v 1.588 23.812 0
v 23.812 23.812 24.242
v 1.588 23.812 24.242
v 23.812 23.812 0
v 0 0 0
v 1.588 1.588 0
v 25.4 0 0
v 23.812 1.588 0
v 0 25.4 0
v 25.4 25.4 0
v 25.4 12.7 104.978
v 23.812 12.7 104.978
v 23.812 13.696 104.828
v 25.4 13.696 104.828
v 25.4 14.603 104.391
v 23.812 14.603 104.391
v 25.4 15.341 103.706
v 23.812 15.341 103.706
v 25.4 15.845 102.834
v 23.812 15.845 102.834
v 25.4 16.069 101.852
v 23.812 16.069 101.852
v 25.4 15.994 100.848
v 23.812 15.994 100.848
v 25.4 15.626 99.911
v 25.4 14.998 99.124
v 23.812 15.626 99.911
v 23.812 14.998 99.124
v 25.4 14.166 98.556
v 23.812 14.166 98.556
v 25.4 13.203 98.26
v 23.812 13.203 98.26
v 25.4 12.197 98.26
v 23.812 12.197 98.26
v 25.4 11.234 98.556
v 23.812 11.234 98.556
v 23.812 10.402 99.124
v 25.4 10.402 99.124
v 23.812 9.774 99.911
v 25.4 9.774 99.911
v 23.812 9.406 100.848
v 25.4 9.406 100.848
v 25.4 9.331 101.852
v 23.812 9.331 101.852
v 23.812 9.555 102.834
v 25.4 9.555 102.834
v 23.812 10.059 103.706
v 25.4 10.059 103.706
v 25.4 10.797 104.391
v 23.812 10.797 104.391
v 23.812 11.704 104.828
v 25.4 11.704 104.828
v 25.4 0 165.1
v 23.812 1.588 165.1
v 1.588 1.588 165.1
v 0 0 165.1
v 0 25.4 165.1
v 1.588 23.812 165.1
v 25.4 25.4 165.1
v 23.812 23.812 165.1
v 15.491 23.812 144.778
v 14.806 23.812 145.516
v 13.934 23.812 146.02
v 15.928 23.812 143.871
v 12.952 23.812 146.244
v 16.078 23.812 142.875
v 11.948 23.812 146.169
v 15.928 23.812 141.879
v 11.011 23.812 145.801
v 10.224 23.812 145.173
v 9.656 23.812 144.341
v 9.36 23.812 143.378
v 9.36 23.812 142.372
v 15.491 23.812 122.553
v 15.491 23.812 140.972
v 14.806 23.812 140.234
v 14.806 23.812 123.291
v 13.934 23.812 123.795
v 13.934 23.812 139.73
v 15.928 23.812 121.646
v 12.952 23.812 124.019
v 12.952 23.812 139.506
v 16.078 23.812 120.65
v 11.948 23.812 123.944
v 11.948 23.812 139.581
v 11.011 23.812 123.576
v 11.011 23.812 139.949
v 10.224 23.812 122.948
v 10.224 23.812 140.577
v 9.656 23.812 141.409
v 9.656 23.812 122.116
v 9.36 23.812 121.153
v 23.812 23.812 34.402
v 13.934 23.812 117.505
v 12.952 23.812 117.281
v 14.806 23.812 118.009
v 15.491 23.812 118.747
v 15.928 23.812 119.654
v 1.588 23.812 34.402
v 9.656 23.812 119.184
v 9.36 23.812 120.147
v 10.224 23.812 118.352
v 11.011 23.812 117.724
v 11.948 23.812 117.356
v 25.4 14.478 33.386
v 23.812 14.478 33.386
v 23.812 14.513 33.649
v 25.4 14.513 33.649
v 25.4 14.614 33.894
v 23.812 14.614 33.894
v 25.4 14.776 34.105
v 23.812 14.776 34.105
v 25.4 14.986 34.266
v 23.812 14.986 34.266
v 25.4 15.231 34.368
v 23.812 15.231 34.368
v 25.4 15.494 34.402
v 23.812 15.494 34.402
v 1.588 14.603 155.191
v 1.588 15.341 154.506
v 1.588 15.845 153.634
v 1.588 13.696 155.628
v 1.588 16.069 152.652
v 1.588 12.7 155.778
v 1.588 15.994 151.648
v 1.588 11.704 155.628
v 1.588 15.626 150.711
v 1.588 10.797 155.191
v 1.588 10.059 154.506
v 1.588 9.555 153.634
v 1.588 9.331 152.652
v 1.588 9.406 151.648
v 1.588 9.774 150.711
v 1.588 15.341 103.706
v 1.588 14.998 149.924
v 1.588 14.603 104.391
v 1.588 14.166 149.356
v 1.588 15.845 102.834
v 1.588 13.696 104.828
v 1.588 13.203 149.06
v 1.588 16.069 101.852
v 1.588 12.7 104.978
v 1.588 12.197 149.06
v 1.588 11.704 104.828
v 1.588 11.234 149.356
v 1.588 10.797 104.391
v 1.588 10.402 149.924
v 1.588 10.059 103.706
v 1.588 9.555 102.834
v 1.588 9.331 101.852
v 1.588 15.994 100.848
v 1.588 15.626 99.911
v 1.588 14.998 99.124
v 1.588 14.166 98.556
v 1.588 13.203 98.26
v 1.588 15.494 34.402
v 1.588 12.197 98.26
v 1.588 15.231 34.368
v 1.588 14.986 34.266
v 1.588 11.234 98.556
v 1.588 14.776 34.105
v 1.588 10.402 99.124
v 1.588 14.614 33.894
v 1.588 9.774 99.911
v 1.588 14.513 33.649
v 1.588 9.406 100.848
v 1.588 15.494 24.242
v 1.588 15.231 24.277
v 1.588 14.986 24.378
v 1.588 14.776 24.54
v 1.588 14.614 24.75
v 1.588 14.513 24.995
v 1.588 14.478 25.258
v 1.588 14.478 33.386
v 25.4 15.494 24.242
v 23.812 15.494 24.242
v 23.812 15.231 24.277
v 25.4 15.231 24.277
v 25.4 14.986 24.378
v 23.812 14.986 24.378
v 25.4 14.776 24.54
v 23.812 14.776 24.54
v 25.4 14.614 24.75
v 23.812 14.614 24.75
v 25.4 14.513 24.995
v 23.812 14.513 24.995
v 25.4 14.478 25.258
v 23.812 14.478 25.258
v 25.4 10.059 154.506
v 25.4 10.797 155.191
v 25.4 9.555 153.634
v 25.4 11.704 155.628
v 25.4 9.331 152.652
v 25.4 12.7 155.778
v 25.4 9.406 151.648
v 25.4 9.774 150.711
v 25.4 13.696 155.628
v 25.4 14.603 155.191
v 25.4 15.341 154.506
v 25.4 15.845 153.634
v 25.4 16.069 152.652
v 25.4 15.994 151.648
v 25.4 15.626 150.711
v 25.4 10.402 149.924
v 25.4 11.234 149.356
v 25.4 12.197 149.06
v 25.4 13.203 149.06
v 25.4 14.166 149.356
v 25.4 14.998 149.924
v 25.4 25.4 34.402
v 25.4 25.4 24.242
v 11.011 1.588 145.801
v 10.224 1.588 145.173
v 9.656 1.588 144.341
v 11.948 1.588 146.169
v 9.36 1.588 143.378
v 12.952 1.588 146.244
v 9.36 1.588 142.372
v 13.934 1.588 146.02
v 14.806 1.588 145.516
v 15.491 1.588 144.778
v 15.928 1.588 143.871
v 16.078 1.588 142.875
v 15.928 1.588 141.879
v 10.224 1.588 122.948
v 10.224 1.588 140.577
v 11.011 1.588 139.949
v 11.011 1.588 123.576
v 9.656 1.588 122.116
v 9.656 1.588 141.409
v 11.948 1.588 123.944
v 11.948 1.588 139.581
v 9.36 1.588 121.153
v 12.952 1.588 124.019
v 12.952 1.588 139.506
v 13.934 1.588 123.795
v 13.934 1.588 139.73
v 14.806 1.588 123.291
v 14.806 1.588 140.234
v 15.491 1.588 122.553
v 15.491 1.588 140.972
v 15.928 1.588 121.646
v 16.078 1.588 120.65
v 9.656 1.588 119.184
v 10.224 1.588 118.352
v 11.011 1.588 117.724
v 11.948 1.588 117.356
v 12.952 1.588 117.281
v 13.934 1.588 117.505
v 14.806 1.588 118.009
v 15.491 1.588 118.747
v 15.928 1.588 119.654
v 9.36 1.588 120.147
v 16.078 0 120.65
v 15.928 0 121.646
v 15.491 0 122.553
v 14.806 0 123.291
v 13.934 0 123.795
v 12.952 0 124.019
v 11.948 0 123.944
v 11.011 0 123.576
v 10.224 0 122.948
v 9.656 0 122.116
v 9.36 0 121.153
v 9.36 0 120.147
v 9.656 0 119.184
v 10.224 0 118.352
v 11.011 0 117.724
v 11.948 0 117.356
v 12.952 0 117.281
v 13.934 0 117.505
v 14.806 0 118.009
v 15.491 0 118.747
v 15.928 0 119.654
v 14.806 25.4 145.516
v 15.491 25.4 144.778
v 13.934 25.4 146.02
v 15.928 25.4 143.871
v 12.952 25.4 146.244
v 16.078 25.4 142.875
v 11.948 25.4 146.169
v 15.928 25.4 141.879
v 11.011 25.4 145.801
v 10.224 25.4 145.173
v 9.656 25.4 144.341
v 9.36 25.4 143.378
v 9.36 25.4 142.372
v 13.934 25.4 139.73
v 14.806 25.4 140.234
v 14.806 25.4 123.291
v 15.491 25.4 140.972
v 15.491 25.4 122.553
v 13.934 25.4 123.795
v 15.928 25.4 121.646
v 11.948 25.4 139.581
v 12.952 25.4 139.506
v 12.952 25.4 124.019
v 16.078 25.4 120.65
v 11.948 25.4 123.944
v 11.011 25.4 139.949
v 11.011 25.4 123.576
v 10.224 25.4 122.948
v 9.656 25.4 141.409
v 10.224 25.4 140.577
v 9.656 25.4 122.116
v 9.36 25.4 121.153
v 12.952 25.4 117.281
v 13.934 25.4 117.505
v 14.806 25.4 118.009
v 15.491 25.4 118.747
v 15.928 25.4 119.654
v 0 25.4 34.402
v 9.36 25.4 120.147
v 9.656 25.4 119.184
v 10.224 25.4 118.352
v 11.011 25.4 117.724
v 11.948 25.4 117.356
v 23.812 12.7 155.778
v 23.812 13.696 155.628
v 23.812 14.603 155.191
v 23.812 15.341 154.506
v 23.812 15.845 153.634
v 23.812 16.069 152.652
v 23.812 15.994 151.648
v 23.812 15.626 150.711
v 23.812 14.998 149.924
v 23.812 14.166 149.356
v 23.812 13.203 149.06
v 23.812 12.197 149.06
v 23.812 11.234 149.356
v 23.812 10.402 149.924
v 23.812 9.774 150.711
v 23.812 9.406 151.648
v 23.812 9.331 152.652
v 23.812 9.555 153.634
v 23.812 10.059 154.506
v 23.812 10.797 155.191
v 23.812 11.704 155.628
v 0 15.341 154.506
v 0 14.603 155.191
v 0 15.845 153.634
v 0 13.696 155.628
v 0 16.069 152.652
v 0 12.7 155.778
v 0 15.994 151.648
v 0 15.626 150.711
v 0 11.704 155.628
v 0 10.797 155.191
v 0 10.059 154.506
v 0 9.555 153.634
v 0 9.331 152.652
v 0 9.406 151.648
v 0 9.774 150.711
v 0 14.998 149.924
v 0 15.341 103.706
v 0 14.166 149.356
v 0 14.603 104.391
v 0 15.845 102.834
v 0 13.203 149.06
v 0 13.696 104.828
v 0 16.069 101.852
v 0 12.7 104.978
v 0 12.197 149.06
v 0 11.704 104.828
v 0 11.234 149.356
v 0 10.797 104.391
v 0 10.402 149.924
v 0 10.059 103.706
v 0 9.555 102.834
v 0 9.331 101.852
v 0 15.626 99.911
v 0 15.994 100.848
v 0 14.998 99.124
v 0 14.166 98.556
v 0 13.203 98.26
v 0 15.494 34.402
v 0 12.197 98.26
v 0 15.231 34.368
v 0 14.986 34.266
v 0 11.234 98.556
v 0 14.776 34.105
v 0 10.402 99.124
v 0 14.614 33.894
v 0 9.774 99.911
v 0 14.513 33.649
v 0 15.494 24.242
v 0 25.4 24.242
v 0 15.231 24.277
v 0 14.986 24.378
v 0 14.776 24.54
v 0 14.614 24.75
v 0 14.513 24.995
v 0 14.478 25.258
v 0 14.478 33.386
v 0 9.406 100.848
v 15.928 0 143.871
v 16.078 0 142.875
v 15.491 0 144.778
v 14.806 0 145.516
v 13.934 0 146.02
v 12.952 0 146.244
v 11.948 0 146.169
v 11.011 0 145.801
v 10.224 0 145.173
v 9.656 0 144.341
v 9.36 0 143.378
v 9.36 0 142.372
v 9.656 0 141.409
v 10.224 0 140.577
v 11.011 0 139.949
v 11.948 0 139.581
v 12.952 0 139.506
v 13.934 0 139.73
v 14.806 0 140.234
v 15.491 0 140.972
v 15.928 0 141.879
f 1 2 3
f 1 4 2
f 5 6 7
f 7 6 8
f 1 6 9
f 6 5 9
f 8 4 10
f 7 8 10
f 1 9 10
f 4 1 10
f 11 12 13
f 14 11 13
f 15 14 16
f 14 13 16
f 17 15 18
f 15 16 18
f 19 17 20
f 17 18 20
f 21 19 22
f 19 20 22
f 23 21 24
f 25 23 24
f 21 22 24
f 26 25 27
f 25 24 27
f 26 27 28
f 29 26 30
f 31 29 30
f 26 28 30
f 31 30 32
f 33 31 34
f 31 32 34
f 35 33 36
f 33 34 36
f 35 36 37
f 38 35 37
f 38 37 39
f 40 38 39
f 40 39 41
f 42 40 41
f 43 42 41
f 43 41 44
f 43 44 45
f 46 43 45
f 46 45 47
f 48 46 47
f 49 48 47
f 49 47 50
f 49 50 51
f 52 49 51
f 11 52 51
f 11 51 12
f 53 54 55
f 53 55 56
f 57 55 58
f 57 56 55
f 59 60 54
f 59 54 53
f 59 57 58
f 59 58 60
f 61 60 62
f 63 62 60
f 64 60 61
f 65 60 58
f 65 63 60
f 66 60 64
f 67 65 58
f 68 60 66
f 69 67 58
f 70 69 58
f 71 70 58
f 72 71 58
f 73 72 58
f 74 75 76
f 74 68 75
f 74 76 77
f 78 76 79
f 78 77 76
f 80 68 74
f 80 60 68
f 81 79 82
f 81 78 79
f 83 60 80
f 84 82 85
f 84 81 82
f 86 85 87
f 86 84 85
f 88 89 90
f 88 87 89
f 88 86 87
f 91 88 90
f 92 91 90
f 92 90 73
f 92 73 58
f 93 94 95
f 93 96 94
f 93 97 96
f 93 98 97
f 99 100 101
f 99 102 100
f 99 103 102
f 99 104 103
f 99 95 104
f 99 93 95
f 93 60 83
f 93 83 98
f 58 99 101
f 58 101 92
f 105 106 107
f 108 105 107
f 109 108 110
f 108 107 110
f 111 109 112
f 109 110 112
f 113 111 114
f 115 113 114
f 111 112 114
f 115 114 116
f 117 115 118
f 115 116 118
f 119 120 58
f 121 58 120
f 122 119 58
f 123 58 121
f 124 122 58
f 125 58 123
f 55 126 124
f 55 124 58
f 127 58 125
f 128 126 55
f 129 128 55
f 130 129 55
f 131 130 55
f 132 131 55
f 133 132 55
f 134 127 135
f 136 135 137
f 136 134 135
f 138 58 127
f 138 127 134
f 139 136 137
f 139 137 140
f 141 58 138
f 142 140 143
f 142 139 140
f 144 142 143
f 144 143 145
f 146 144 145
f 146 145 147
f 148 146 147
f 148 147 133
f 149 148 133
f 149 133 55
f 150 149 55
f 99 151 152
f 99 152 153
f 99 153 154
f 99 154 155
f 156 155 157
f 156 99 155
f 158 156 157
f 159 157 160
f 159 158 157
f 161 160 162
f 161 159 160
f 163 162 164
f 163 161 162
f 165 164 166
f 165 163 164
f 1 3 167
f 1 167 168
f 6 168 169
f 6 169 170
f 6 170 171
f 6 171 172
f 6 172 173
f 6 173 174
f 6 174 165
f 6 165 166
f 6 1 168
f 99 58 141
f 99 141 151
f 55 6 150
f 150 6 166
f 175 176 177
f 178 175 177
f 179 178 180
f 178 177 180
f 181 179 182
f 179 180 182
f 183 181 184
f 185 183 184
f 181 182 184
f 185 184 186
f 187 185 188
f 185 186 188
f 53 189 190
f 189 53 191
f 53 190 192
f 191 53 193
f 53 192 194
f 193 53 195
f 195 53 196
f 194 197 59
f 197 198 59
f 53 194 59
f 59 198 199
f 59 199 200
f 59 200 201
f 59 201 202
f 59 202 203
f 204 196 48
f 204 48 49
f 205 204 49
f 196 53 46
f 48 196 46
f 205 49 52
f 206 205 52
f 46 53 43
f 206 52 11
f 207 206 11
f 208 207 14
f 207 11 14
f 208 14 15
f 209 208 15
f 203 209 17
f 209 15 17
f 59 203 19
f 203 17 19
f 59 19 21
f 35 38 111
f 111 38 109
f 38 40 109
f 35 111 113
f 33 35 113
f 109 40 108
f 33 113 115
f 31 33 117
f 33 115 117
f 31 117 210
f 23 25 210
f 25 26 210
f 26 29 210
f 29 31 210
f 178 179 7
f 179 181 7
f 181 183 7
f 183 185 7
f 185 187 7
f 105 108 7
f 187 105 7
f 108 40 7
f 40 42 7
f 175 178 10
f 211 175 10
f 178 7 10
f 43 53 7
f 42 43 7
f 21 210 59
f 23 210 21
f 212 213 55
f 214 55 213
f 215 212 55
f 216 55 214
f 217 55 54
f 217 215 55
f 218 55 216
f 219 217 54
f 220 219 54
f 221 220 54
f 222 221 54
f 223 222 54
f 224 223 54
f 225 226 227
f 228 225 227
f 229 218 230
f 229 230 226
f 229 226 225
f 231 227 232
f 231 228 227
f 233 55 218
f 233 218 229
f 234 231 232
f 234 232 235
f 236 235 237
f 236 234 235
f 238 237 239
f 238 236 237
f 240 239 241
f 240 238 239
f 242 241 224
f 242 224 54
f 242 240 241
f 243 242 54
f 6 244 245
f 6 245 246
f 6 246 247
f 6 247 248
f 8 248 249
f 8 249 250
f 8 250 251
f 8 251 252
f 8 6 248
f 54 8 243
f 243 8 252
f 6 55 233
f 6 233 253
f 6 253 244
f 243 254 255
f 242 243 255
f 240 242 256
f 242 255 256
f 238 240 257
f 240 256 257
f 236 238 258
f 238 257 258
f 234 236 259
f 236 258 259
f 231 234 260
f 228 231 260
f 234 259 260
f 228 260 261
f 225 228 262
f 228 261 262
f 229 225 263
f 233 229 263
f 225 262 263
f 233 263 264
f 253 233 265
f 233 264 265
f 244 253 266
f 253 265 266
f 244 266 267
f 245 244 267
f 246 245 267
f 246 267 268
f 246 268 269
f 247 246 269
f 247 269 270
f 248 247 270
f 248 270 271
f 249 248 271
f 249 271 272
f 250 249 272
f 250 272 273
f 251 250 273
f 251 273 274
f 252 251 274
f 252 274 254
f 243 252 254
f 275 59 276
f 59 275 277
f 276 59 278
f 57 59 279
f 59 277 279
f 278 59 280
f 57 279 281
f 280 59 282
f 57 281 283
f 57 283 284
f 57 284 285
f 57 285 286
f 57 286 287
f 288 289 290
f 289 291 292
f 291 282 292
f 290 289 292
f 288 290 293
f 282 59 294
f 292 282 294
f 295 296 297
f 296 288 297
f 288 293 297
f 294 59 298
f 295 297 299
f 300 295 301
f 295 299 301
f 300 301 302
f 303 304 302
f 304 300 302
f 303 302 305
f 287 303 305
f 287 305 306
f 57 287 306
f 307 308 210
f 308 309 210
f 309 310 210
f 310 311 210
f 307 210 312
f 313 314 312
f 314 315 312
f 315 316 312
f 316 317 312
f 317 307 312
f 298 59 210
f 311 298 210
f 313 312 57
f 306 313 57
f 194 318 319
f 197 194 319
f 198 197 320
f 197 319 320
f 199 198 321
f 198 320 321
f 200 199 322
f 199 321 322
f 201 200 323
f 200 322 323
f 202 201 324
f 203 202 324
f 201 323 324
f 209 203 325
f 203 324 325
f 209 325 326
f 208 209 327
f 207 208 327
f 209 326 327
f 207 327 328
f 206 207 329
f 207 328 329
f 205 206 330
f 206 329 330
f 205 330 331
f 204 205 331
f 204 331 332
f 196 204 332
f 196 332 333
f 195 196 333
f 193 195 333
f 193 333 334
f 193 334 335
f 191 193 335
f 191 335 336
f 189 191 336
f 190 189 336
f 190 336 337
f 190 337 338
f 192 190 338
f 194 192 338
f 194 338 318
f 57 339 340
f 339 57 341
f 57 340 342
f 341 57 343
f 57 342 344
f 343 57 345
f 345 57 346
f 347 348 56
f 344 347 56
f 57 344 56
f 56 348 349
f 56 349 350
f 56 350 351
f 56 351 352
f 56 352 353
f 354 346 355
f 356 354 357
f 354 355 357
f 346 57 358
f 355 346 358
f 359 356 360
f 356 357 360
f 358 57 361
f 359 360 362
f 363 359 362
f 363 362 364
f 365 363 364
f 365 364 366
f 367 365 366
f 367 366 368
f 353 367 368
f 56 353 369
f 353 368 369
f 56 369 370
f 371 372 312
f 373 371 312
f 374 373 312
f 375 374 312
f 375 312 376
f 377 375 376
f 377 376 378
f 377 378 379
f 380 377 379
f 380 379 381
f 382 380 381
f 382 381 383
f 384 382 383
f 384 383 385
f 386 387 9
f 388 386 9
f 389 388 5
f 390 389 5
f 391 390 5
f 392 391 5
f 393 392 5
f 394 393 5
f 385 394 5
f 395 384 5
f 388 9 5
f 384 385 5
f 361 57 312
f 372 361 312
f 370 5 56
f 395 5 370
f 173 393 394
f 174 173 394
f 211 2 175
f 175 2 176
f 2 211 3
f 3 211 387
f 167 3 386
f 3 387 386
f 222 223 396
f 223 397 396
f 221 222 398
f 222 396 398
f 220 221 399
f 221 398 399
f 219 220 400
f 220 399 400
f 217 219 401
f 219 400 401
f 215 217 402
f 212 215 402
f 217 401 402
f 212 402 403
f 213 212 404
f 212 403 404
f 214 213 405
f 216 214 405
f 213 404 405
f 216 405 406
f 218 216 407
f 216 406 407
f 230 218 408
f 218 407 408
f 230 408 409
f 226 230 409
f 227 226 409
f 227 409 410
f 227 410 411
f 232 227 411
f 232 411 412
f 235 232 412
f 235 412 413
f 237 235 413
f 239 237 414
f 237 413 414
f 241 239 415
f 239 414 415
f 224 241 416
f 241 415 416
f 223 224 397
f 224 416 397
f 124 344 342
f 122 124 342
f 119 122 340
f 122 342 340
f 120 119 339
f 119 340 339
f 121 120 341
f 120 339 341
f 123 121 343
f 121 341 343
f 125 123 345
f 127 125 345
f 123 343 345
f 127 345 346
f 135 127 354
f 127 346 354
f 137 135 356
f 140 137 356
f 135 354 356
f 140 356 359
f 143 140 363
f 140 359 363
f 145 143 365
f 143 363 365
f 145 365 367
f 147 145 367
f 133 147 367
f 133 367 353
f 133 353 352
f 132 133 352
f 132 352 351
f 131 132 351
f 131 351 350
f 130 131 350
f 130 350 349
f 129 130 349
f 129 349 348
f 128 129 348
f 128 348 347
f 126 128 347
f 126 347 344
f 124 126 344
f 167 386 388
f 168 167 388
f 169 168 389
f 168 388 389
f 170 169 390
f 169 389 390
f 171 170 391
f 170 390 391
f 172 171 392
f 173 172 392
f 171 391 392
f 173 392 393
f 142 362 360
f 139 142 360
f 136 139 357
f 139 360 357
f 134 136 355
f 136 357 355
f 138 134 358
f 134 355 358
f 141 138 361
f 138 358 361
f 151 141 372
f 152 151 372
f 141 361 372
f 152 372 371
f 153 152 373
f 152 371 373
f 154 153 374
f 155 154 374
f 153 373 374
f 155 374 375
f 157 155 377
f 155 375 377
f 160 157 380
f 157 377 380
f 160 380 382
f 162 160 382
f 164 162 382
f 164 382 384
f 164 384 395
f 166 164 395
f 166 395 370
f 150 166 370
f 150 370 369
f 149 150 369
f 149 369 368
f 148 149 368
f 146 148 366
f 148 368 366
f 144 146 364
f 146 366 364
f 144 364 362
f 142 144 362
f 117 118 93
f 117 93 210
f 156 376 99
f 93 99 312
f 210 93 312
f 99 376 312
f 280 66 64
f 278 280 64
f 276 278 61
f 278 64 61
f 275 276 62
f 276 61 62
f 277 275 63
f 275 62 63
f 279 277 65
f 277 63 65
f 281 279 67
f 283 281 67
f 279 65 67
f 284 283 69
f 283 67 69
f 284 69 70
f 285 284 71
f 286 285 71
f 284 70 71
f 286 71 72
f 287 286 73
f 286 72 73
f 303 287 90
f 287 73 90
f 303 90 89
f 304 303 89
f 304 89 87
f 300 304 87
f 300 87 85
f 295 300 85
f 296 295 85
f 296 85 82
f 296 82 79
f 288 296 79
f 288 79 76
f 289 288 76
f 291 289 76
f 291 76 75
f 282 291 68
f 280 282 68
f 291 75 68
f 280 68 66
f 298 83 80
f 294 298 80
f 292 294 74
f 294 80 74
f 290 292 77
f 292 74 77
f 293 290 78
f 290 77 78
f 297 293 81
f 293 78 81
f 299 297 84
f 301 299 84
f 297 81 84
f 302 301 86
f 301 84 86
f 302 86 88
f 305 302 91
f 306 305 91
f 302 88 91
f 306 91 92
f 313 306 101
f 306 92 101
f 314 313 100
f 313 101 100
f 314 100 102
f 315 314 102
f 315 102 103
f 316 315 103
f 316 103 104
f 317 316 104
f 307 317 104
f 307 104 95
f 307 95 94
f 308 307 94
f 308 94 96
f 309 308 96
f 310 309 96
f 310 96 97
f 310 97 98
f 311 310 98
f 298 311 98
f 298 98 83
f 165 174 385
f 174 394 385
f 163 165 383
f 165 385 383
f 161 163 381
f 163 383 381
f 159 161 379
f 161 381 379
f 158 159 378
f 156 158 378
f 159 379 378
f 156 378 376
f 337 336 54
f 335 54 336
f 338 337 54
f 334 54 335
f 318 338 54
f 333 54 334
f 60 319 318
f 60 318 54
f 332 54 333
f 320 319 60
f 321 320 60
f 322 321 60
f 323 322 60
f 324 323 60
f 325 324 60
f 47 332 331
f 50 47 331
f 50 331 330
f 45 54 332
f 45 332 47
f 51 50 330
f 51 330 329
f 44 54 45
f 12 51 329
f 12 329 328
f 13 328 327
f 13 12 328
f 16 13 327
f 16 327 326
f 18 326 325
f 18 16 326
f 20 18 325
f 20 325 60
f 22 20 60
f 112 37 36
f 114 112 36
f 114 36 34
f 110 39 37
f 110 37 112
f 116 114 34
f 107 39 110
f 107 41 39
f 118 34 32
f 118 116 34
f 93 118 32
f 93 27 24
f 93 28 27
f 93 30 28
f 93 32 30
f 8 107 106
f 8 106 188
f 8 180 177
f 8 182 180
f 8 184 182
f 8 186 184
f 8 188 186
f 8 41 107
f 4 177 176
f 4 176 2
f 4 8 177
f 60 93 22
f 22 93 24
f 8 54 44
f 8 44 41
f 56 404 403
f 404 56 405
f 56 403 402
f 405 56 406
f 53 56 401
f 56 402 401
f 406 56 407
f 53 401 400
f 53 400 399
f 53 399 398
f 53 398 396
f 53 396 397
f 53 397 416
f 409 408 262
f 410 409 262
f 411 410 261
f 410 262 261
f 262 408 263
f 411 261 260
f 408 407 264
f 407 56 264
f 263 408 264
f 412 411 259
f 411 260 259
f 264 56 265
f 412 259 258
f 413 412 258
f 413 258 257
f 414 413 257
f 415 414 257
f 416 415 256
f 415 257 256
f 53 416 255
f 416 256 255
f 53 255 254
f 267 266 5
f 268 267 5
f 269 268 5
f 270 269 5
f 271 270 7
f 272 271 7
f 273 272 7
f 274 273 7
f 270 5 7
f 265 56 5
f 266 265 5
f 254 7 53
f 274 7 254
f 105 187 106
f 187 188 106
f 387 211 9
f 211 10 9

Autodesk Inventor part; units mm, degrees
ref_plane "YZ Plane" through (0, 0, 0) normal (1, 0, 0) x (0, 1, 0)
ref_plane "XZ Plane" through (0, 0, 0) normal (0, 1, 0) x (-1, 0, 0)
ref_plane "XY Plane" through (0, 0, 0) normal (0, 0, 1) x (1, 0, 0)
sketch "Sketch1" plane through (0, 0, 0) normal (0, 0, 1) x (1, 0, 0)
  line L0 (0, 0) -> (25.4, 0)
  line L1 (25.4, 0) -> (25.4, 25.4)
  line L2 (25.4, 25.4) -> (0, 25.4)
  line L3 (0, 25.4) -> (0, 0)
  line L4 (1.5875, 1.5875) -> (23.8125, 1.5875)
  line L5 (23.8125, 1.5875) -> (23.8125, 23.8125)
  line L6 (23.8125, 23.8125) -> (1.5875, 23.8125)
  line L7 (1.5875, 23.8125) -> (1.5875, 1.5875)
  dimension "d0" = 25.4
  dimension "d1" = 25.4
  dimension "d2" = 1.5875
extrude "Extrusion1" add sketch "Sketch1" along normal blind 165.1
sketch "Sketch2" plane through (0, 0, 0) normal (-1, 0, 0) x (0, 0, 1)
  arc A0 (33.3863, 14.478) -> (34.4023, 15.494) centre (33.3863, 15.494) ccw projected
  line L0 (34.4023, 15.494) -> (34.4023, 25.4) projected
  line L1 (34.4023, 25.4) -> (24.2423, 25.4) projected
  line L2 (24.2423, 25.4) -> (24.2423, 15.494) projected
  arc A1 (24.2423, 15.494) -> (25.2583, 14.478) centre (25.2583, 15.494) ccw projected
  line L3 (25.2583, 14.478) -> (33.3863, 14.478) projected
  circle A2 centre (29.3223, 19.05) radius 4.0005 projected
extrude "Extrusion2" cut sketch "Sketch2" against normal blind 25.4 contours L3 A1 L2 L1 L0 A0 | A2
sketch "Sketch3" plane through (0, 0, 0) normal (0, -1, 0) x (1, 0, 0)
  circle A0 centre (12.7, 142.875) radius 3.3782 projected
  circle A1 centre (12.7, 120.65) radius 3.3782 projected
extrude "Extrusion3" cut sketch "Sketch3" against normal blind 25.4
sketch "Sketch4" plane through (0, 0, 0) normal (-1, 0, 0) x (0, 0, 1)
  circle A0 centre (152.4, 12.7) radius 3.3782 projected
  circle A1 centre (101.6, 12.7) radius 3.3782 projected
extrude "Extrusion4" cut sketch "Sketch4" against normal blind 25.4
properties part number "Camera Traffic Light Mount" material "Acetal Resin, White"
